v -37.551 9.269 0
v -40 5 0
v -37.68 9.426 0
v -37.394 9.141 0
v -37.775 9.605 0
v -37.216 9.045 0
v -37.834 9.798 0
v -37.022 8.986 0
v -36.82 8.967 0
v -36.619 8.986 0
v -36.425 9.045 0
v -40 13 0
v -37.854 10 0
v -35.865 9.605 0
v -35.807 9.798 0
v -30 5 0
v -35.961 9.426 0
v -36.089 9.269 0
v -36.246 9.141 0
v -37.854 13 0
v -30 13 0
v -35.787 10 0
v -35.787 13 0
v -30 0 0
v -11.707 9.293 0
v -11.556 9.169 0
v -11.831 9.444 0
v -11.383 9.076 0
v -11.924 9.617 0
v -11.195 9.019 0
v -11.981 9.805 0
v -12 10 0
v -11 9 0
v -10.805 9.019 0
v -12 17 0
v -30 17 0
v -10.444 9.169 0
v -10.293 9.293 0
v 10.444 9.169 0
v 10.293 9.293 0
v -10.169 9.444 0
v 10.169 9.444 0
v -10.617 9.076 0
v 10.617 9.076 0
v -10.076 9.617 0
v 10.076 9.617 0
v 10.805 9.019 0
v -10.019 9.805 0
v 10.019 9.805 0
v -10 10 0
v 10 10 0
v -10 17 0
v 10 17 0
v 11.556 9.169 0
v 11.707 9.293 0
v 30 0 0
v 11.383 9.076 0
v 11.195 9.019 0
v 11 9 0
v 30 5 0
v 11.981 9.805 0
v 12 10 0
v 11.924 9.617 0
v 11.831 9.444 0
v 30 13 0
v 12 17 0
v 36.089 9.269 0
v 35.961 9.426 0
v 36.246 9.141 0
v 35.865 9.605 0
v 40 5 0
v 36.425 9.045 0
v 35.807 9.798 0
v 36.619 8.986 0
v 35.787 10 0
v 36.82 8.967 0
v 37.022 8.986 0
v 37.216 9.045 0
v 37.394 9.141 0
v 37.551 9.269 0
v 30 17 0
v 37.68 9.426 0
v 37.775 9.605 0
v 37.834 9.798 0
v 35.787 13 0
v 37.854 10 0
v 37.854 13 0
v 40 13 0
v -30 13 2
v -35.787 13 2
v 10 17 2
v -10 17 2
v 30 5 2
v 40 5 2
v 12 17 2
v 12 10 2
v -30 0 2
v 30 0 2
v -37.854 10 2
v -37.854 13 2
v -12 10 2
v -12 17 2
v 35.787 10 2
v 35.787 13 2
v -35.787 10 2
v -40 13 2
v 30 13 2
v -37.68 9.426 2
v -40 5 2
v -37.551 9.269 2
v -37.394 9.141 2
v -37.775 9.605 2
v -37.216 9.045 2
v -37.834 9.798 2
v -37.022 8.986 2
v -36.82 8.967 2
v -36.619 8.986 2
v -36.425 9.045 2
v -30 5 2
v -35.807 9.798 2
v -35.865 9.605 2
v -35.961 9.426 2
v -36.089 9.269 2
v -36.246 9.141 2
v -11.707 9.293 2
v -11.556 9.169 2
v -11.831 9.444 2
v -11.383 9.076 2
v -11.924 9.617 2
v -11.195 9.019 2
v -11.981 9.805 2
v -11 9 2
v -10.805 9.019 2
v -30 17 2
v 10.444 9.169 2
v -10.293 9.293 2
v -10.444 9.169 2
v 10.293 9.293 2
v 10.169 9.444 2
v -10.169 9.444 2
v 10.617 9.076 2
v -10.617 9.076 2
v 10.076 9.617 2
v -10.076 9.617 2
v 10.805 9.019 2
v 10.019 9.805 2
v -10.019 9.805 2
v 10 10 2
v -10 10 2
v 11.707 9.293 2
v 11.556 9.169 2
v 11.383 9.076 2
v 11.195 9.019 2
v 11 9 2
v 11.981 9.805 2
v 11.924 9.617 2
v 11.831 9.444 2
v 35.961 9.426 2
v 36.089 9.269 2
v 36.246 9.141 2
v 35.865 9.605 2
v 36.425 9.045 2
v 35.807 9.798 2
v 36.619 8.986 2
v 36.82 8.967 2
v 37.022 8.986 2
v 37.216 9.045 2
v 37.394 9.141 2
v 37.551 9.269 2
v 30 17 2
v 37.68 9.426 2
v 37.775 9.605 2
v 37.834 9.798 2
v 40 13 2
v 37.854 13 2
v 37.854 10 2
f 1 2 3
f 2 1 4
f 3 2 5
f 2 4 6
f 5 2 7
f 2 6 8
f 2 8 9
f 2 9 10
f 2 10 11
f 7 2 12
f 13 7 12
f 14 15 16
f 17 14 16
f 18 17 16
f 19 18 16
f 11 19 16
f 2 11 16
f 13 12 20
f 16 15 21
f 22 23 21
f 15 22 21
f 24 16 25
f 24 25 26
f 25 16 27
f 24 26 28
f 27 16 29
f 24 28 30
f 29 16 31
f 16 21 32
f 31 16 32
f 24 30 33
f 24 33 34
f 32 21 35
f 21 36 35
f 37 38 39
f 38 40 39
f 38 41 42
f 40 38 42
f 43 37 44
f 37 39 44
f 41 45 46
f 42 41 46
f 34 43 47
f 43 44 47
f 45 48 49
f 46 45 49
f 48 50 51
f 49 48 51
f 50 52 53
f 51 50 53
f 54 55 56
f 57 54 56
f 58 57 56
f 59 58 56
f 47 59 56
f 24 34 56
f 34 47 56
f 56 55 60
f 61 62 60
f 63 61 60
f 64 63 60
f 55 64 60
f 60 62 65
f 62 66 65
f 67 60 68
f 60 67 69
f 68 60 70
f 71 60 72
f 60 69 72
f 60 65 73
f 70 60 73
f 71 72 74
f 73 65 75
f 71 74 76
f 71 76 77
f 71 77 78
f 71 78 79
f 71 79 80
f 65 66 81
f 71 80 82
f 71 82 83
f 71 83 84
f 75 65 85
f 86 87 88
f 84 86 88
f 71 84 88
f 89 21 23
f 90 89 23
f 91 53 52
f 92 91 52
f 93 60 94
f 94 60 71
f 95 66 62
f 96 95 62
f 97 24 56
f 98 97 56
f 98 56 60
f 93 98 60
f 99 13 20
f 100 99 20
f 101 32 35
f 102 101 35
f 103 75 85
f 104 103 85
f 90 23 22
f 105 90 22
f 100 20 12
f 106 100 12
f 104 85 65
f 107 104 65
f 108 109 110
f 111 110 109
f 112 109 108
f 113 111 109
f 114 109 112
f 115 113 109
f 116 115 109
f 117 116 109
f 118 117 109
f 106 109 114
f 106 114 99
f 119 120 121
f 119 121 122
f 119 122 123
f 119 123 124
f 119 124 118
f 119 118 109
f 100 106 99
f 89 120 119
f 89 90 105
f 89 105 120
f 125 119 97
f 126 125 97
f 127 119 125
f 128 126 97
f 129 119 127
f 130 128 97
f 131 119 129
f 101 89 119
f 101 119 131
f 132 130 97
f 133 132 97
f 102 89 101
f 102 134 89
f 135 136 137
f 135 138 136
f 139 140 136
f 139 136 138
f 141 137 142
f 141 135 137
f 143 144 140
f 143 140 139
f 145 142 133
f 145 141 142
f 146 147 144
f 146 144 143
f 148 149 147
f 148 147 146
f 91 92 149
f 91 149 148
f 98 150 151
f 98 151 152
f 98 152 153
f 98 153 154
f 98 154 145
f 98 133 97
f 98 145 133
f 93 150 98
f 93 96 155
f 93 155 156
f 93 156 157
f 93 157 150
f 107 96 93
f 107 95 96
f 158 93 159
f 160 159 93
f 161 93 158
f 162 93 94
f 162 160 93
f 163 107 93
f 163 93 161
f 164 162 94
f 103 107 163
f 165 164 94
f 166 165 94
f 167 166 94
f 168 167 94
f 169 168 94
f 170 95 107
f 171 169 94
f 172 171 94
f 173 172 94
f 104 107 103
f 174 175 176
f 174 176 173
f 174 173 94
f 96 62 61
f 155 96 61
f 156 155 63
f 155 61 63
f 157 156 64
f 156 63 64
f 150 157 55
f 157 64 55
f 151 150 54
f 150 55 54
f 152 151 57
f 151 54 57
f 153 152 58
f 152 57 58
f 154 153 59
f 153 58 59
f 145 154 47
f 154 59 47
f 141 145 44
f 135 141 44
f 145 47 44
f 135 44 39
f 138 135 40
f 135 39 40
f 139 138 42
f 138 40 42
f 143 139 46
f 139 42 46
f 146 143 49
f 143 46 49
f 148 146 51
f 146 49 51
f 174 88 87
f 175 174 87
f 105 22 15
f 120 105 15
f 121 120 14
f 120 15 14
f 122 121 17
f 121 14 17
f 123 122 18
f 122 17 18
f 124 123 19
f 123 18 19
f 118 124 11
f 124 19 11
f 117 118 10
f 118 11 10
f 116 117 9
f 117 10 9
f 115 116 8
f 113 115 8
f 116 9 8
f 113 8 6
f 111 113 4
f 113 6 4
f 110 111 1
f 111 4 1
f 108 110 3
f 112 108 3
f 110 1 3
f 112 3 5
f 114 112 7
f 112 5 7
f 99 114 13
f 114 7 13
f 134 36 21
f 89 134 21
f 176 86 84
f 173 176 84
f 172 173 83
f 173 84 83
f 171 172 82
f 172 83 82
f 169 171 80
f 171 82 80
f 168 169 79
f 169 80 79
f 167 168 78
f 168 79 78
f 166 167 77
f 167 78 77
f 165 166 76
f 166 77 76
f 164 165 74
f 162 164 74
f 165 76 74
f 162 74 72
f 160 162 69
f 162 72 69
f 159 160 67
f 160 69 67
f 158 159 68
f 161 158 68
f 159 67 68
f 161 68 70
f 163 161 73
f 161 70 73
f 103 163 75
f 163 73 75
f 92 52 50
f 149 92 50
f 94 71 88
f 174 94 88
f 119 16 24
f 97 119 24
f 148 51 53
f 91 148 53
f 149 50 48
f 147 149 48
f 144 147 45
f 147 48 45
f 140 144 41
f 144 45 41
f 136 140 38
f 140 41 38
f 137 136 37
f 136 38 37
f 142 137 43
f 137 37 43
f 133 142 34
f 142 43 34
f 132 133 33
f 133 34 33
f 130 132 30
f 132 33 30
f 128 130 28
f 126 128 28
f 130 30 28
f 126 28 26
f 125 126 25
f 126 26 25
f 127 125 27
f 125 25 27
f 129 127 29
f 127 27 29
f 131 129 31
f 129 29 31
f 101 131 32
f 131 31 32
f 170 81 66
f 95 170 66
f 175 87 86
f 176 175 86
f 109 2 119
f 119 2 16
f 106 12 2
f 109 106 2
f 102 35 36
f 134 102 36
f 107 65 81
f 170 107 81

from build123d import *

# Parameters (mm, degrees)
RESSALTO_EXTRUS_O1_DEPTH = 2


with BuildPart() as part:
    # Esboço1 → Ressalto-extrusão1 (new body)
    with BuildSketch(Plane.XY):
        with BuildLine():
            Line((-30, 5), (-30, 0))
            Line((-30, 0), (30, 0))
            Line((30, 0), (30, 5))
            Line((30, 5), (40, 5))
            Line((40, 5), (40, 13))
            Line((40, 13), (37.853679508, 13))
            Line((37.853679508, 13), (37.853679508, 10))
            ThreePointArc((37.853679508, 10), (36.820223821, 8.966544314), (35.786768135, 10))
            Line((35.786768135, 10), (35.786768135, 13))
            Line((35.786768135, 13), (30, 13))
            Line((30, 13), (30, 17))
            Line((30, 17), (12, 17))
            Line((12, 17), (12, 10))
            ThreePointArc((12, 10), (11, 9), (10, 10))
            Line((10, 10), (10, 17))
            Line((10, 17), (-10, 17))
            Line((-10, 17), (-10, 10))
            ThreePointArc((-10, 10), (-11, 9), (-12, 10))
            Line((-12, 10), (-12, 17))
            Line((-12, 17), (-30, 17))
            Line((-30, 17), (-30, 13))
            Line((-30, 13), (-35.786768135, 13))
            Line((-35.786768135, 13), (-35.786768135, 10))
            ThreePointArc((-35.786768135, 10), (-36.820223821, 8.966544314), (-37.853679508, 10))
            Line((-37.853679508, 10), (-37.853679508, 13))
            Line((-37.853679508, 13), (-40, 13))
            Line((-40, 13), (-40, 5))
            Line((-40, 5), (-30, 5))
        make_face()
    extrude(amount=RESSALTO_EXTRUS_O1_DEPTH)


solid = part.part
